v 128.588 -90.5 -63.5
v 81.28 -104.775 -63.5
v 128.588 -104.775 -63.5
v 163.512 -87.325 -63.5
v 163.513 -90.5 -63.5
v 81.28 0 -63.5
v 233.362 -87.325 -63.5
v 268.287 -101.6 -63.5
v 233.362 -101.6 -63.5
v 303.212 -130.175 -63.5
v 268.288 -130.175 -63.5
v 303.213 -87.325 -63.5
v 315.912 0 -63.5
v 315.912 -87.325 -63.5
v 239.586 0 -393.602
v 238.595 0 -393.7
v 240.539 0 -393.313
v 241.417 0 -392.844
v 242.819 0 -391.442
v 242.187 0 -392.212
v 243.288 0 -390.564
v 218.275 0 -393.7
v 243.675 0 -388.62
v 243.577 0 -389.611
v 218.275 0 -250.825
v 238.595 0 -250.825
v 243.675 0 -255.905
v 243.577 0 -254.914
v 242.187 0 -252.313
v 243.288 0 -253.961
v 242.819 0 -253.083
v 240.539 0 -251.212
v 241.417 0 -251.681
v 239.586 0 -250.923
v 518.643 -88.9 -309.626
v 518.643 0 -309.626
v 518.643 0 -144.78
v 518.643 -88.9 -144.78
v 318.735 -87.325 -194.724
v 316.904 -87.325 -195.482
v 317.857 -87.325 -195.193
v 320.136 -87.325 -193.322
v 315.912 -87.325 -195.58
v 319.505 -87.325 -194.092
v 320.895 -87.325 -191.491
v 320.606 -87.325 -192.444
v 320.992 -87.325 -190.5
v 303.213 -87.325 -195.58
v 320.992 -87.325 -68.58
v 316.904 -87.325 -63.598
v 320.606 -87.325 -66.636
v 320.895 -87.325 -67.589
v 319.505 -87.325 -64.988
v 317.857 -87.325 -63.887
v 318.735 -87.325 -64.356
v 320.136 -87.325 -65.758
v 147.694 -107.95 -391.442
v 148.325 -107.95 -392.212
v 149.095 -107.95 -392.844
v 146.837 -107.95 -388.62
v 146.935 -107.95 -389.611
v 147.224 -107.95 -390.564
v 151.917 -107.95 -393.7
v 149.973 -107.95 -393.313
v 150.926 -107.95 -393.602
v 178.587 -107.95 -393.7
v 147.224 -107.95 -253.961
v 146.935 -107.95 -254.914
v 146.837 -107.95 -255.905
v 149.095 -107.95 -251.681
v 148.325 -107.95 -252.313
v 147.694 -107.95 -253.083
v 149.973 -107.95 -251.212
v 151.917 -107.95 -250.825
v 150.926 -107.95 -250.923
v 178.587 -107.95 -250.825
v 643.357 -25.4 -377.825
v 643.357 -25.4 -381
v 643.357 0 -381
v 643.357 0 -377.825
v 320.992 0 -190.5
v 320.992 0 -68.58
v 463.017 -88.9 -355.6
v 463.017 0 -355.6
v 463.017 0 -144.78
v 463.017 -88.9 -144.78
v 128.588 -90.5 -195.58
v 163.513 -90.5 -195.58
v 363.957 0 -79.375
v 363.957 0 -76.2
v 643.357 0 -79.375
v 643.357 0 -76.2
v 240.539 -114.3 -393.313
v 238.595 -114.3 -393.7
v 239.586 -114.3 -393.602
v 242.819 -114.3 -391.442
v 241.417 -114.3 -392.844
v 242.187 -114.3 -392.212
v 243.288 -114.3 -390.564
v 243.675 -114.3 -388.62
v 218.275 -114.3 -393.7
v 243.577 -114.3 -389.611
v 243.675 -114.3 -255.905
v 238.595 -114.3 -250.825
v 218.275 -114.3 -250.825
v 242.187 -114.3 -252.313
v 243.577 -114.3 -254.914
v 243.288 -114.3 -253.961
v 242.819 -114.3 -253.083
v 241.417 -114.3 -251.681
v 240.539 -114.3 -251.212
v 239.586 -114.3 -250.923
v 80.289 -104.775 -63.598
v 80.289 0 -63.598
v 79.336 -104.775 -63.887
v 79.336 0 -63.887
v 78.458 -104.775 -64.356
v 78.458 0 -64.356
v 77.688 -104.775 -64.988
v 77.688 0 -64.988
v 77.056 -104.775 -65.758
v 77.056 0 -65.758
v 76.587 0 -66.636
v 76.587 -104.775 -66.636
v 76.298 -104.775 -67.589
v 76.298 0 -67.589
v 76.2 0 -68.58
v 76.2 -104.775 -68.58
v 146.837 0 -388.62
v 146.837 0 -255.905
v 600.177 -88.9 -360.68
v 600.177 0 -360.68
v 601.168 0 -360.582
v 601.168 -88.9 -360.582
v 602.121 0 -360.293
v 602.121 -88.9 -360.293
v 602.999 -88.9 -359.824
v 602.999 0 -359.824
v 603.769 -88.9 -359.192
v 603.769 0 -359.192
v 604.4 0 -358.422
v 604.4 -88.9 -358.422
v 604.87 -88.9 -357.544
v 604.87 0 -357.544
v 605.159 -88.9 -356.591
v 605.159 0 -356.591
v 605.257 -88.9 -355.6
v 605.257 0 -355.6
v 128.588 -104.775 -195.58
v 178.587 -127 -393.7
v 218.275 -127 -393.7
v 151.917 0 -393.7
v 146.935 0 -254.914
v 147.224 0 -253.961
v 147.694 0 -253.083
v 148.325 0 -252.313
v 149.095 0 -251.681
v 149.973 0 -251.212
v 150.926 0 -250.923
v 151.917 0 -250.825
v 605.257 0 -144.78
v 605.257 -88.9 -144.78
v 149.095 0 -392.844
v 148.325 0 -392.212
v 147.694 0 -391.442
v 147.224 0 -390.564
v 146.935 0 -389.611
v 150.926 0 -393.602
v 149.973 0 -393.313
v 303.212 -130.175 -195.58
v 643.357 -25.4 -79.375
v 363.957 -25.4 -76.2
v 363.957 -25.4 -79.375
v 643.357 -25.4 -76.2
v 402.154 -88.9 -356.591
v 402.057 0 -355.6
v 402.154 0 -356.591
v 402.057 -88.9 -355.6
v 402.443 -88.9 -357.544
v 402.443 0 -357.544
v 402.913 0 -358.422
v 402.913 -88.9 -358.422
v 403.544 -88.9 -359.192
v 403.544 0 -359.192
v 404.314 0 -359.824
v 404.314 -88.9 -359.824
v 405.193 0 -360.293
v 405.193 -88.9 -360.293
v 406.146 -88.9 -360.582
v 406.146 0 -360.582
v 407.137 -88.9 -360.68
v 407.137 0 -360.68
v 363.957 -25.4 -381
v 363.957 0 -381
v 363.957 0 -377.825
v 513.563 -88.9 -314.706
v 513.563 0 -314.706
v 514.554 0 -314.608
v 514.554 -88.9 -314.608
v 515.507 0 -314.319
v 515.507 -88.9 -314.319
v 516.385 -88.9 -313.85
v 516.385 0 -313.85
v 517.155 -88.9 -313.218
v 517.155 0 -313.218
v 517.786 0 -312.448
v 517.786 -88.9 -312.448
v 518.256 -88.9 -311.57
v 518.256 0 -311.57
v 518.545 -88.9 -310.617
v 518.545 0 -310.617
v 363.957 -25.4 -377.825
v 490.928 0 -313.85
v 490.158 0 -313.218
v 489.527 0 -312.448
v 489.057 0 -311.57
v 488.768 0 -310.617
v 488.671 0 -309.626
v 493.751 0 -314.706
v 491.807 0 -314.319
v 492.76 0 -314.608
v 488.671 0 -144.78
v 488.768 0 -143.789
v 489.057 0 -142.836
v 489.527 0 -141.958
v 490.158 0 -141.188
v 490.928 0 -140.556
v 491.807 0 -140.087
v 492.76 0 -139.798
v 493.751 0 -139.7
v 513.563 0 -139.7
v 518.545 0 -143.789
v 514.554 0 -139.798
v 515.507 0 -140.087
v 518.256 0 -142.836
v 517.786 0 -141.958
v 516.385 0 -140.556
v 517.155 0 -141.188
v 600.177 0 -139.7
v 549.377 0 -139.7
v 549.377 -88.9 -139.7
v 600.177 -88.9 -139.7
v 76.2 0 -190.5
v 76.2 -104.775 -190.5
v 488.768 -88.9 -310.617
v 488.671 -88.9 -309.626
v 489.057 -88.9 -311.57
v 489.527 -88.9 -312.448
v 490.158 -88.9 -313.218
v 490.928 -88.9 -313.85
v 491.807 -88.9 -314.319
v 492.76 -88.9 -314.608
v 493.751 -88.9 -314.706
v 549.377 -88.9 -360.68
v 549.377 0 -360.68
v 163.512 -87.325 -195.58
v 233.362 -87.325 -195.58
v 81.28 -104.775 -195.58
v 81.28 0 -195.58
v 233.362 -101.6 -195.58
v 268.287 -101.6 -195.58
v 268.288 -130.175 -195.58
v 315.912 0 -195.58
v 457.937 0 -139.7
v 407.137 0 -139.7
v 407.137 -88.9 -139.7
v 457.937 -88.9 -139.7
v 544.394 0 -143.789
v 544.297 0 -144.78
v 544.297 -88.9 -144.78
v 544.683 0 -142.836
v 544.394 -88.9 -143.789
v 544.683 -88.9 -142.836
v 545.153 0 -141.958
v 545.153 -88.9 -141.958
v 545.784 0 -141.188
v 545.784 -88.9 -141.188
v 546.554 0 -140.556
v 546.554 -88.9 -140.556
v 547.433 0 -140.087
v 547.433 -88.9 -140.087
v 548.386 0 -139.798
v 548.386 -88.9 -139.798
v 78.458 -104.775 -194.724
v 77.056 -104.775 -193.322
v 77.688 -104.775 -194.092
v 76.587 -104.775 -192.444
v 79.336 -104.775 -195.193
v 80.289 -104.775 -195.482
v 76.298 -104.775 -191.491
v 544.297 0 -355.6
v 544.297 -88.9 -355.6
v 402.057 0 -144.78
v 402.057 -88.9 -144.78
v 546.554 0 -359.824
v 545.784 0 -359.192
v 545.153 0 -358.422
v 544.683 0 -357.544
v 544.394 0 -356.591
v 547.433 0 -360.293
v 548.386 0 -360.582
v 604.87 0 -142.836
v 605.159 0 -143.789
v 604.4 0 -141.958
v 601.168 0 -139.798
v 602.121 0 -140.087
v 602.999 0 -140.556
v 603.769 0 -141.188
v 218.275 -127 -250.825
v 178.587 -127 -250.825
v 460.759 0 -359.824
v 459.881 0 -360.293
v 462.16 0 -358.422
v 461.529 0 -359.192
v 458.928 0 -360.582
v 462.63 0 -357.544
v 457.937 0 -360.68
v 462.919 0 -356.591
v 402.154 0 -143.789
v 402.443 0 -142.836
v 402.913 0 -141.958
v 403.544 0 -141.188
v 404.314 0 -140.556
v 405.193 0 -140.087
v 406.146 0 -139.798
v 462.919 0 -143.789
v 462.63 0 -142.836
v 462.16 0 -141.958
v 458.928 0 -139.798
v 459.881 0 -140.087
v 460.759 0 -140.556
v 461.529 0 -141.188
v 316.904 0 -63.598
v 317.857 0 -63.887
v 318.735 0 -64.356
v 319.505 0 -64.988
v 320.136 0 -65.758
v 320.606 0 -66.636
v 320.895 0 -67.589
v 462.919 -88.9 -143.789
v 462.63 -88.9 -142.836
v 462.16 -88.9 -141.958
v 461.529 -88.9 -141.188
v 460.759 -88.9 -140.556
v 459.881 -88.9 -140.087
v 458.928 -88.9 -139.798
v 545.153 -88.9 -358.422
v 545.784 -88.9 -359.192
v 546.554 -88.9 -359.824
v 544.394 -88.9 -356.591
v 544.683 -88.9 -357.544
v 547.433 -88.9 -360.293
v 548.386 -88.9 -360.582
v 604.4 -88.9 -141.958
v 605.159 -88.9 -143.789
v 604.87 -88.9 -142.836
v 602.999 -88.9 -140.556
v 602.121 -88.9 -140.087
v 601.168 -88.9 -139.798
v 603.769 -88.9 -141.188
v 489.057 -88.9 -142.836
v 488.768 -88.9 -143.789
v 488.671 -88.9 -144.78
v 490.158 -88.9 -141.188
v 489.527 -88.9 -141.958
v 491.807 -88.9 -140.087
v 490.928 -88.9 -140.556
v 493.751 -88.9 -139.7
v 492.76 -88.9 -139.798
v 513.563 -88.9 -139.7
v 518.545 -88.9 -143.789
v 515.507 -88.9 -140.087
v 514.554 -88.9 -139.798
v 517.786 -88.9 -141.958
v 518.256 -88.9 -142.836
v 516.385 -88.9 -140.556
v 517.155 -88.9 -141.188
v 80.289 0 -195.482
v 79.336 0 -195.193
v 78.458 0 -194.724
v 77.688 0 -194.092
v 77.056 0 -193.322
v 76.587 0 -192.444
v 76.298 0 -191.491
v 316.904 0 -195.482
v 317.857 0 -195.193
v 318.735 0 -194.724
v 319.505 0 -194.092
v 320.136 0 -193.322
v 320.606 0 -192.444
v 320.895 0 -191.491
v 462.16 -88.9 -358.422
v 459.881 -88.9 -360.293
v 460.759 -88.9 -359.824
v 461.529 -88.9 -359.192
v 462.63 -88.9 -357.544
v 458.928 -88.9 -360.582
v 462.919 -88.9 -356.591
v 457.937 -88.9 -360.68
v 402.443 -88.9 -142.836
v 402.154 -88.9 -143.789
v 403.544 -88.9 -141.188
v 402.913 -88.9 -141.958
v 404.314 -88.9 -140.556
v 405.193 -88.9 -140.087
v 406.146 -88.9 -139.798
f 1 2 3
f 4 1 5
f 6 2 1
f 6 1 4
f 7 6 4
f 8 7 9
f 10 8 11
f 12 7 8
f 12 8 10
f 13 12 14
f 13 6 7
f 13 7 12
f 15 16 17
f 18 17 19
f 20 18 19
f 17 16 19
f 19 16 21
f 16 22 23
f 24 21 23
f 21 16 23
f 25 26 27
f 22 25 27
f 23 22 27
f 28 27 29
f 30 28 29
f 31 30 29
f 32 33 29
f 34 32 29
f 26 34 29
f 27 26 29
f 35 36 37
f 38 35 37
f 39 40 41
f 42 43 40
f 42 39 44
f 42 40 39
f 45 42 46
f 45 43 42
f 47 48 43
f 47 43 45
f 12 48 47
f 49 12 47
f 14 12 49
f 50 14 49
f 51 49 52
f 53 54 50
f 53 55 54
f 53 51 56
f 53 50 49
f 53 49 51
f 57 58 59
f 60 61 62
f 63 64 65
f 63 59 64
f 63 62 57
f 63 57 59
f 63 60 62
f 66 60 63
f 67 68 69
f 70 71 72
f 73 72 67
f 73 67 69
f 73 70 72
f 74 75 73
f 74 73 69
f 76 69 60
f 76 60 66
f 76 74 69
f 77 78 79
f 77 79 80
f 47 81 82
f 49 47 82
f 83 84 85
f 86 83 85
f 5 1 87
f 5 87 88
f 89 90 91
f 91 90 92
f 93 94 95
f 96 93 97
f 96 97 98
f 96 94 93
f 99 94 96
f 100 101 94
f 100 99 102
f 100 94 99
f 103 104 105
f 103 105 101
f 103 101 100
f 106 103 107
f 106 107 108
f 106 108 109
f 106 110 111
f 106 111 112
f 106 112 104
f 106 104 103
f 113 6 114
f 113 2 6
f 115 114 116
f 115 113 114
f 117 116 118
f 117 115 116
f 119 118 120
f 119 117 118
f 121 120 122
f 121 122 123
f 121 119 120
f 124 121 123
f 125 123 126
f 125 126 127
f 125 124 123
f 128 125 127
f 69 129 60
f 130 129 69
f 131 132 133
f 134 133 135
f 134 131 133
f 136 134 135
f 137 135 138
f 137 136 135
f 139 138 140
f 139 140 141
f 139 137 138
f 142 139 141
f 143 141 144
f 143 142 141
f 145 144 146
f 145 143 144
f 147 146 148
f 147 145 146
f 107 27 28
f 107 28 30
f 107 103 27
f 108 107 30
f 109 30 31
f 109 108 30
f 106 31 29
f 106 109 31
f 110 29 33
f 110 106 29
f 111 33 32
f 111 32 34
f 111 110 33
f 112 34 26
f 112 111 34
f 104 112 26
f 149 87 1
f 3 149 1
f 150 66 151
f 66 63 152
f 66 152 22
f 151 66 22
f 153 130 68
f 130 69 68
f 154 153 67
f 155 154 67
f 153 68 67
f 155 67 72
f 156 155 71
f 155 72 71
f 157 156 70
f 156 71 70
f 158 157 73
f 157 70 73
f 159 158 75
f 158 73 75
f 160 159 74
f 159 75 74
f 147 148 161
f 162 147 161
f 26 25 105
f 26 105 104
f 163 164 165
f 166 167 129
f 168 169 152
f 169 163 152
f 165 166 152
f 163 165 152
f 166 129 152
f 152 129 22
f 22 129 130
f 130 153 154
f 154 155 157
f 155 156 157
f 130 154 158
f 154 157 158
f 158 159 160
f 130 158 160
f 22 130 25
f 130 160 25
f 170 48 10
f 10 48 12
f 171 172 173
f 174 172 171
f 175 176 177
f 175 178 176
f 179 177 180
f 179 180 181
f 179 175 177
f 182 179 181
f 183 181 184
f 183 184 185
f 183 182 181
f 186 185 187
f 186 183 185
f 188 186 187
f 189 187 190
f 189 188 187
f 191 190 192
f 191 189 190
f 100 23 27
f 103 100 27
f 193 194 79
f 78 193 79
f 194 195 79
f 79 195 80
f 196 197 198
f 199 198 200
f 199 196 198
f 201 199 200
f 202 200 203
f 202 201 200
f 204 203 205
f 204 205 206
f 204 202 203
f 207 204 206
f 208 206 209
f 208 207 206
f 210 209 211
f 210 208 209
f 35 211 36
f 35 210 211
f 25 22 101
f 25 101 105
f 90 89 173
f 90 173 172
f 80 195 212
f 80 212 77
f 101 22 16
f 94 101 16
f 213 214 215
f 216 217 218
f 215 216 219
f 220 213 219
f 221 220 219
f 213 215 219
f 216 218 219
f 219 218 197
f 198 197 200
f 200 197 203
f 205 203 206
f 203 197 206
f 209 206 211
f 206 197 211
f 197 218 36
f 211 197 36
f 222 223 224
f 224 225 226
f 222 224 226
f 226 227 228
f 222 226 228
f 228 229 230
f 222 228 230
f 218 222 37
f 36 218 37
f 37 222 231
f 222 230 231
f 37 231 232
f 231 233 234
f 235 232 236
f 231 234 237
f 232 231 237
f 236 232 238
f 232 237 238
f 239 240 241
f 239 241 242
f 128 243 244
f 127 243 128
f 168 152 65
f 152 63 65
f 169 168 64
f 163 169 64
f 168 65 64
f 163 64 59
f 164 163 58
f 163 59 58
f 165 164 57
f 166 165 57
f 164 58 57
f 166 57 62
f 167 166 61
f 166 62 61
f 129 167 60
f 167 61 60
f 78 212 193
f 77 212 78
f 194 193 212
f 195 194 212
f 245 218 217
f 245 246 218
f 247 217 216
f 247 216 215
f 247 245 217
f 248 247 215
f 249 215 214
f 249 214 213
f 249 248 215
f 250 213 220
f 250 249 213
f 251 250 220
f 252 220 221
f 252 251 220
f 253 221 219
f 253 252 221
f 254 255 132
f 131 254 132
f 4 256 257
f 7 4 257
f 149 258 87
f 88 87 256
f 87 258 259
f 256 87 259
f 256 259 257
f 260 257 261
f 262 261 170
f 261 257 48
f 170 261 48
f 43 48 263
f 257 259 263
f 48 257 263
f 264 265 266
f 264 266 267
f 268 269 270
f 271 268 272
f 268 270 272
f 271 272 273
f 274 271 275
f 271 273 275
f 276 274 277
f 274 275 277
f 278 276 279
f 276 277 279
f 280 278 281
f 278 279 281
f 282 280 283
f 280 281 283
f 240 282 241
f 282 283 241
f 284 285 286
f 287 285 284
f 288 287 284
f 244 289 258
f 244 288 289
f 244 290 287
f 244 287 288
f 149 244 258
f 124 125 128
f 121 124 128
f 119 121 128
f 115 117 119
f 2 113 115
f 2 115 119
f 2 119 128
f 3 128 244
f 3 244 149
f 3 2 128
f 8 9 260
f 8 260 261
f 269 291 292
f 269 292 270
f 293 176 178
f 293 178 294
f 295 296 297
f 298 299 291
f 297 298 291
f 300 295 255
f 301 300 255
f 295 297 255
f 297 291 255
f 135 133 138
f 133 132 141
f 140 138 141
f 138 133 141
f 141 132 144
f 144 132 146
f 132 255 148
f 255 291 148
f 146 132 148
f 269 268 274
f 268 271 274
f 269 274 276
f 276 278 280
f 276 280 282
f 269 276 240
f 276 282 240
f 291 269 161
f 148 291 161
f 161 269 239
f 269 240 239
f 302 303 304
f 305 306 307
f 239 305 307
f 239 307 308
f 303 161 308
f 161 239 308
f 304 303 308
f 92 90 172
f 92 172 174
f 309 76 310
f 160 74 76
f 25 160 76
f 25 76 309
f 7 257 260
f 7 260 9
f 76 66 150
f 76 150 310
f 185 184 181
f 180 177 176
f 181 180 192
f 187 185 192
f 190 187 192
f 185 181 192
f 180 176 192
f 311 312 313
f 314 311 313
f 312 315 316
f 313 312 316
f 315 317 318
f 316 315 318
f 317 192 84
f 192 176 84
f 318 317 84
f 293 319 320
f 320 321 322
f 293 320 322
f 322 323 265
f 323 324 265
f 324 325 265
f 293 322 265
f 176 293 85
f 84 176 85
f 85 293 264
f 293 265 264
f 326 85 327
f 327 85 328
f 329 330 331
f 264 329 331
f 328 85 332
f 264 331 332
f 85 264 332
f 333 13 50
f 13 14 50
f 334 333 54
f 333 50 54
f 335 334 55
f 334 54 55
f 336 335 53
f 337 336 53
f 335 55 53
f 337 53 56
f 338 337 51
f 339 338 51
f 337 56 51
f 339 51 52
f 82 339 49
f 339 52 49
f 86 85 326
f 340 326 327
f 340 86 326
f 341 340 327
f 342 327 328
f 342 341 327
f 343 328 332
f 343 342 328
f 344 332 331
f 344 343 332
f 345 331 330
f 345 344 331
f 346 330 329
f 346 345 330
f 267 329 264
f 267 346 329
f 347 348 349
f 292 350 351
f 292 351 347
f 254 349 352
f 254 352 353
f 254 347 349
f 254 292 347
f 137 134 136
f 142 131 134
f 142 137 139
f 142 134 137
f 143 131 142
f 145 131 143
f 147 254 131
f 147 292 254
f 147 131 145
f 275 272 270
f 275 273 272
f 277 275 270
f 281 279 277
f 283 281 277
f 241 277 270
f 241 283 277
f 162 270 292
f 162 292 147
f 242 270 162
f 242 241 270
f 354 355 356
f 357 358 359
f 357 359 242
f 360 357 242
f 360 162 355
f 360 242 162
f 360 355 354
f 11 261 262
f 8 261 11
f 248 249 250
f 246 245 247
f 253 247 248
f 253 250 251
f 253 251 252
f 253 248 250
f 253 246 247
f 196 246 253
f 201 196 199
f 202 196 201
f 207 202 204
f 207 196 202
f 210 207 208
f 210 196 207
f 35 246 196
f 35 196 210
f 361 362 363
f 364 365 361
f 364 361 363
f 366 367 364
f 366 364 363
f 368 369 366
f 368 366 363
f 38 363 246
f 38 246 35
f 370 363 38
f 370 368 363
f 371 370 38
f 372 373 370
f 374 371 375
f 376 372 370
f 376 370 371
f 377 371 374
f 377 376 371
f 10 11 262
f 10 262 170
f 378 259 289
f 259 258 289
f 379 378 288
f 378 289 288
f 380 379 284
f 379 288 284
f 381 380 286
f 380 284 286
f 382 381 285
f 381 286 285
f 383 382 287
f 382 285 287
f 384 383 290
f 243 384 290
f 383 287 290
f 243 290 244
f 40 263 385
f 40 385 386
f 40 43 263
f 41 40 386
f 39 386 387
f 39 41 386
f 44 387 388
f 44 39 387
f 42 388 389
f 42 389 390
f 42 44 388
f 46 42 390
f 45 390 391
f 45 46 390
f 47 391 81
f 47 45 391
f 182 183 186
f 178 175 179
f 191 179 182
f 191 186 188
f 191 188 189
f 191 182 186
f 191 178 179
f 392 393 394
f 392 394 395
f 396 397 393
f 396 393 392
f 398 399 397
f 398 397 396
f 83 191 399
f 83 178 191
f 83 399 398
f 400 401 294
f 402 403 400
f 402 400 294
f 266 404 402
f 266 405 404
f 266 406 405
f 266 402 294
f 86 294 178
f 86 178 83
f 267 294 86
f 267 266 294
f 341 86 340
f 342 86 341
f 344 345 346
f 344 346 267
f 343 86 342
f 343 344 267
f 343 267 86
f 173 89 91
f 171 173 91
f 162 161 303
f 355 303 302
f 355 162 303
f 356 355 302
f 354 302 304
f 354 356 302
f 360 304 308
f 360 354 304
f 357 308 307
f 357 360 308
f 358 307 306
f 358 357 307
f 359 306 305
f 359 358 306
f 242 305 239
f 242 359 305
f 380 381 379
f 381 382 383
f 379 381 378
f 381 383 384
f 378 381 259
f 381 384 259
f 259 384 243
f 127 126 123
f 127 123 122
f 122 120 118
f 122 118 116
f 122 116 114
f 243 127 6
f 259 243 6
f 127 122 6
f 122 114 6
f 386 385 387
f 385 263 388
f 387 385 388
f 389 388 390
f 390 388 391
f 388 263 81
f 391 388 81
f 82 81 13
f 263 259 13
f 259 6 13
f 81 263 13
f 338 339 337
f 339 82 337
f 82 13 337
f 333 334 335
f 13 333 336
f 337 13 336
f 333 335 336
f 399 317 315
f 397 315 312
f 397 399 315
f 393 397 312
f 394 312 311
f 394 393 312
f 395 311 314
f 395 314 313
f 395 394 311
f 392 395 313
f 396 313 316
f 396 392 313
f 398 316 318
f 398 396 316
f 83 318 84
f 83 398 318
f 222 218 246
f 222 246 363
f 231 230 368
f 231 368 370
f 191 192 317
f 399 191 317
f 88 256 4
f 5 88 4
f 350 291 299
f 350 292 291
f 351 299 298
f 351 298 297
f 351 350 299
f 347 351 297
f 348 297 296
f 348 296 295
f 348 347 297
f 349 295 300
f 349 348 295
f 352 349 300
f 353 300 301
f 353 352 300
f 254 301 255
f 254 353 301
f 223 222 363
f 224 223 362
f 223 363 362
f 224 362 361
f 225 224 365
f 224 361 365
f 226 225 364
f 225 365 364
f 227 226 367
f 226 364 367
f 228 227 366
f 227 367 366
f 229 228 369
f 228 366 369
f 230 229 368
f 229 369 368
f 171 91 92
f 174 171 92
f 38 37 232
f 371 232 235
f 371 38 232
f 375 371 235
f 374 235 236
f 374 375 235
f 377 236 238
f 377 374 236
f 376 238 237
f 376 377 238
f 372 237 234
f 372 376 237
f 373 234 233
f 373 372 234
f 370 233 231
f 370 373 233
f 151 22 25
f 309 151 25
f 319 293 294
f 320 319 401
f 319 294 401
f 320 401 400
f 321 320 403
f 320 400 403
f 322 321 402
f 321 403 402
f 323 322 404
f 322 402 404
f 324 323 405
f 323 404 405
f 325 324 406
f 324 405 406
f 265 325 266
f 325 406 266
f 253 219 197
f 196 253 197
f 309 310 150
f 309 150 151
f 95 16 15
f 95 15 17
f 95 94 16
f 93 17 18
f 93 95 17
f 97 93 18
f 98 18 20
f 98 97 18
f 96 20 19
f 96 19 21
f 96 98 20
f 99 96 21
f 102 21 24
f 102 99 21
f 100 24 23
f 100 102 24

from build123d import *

# Parameters (mm, degrees)
F0_W      = 60.96
F0_H      = 220.98
F1_DEPTH  = 88.9
F0_W_2    = 29.972
F0_H_2    = 175.006
F2_R      = 5.08
F2_2_R    = 5.08
F2_3_R    = 5.08
F3_R      = 5.08
F0_W_3    = 52.3875
F0_H_3    = 132.08
F4_DEPTH  = 104.775
F0_W_4    = 34.925
F5_DEPTH  = 90.5002
F0_W_5    = 69.85
F6_DEPTH  = 87.3252
F7_DEPTH  = 101.6
F8_DEPTH  = 130.175
F0_W_6    = 17.78
F9_DEPTH  = 87.3252
F0_W_7    = 31.75
F0_H_4    = 142.875
F10_DEPTH = 107.95
F0_W_8    = 39.6875
F11_DEPTH = 127
F0_W_9    = 25.4
F12_DEPTH = 114.3
F13_W     = 279.4
F13_H     = 3.175
F14_DEPTH = 25.4
F15_R     = 5.08
F15_2_R   = 5.08
F15_3_R   = 5.08


with BuildPart() as f1:
    # F0 (on Front) → F1 (new body)
    with BuildSketch(Plane.XZ):
        with Locations((432.5366, -250.19)):
            Rectangle(F0_W, F0_H)
    extrude(amount=F1_DEPTH)

    # F2
    f2_edges = [f1.edges().sort_by_distance(p)[0] for p in [
        (463.0166, -44.45, -139.7),
        (402.0566, -44.45, -139.7),
        (402.0566, -44.45, -360.68),
        (463.0166, -44.45, -360.68),
    ]]
    fillet(f2_edges, radius=F2_R)


with BuildPart() as f1b:
    # F0 (on Front) → F1, piece 2 (new body)
    with BuildSketch(Plane.XZ):
        with Locations((574.7766, -250.19)):
            Rectangle(F0_W, F0_H)
    extrude(amount=F1_DEPTH)

    # F2#2
    f2_2_edges = [f1b.edges().sort_by_distance(p)[0] for p in [
        (605.2566, -44.45, -139.7),
        (544.2966, -44.45, -139.7),
        (544.2966, -44.45, -360.68),
        (605.2566, -44.45, -360.68),
    ]]
    fillet(f2_2_edges, radius=F2_2_R)


with BuildPart() as f1c:
    # F0 (on Front) → F1, piece 3 (new body)
    with BuildSketch(Plane.XZ):
        with Locations((503.6566, -227.203)):
            Rectangle(F0_W_2, F0_H_2)
    extrude(amount=F1_DEPTH)

    # F2#3
    f2_3_edges = [f1c.edges().sort_by_distance(p)[0] for p in [
        (518.6426, -44.45, -139.7),
        (488.6706, -44.45, -314.706),
        (518.6426, -44.45, -314.706),
    ]]
    fillet(f2_3_edges, radius=F2_3_R)

    # F3
    f3_edges = [f1c.edges().sort_by_distance(p)[0] for p in [
        (488.6706, -44.45, -139.7),
    ]]
    fillet(f3_edges, radius=F3_R)


with BuildPart() as f4:
    # F0 (on Front) → F4 (new body)
    with BuildSketch(Plane.XZ):
        with Locations((102.39375, -129.54)):
            Rectangle(F0_W_3, F0_H_3)
    extrude(amount=F4_DEPTH)

    # F0 (on Front) → F5 (join)
    with BuildSketch(Plane.XZ):
        with Locations((146.05, -129.54)):
            Rectangle(F0_W_4, F0_H_3)
    extrude(amount=F5_DEPTH)

    # F0 (on Front) → F6 (join)
    with BuildSketch(Plane.XZ):
        with Locations((198.4375, -129.54)):
            Rectangle(F0_W_5, F0_H_3)
    extrude(amount=F6_DEPTH)

    # F0 (on Front) → F7 (join)
    with BuildSketch(Plane.XZ):
        with Locations((250.825, -129.54)):
            Rectangle(F0_W_4, F0_H_3)
    extrude(amount=F7_DEPTH)

    # F0 (on Front) → F8 (join)
    with BuildSketch(Plane.XZ):
        with Locations((285.75, -129.54)):
            Rectangle(F0_W_4, F0_H_3)
    extrude(amount=F8_DEPTH)

    # F0 (on Front) → F9 (join)
    with BuildSketch(Plane.XZ):
        with Locations((312.1025, -129.54)):
            Rectangle(F0_W_6, F0_H_3)
    extrude(amount=F9_DEPTH)

    # F15
    f15_edges = [f4.edges().sort_by_distance(p)[0] for p in [
        (320.9925, -43.6626, -63.5),
        (76.2, -52.3875, -63.5),
        (320.9925, -43.6626, -195.58),
        (76.2, -52.3875, -195.58),
    ]]
    fillet(f15_edges, radius=F15_R)


with BuildPart() as f10:
    # F0 (on Front) → F10 (new body)
    with BuildSketch(Plane.XZ):
        with Locations((162.7124, -322.2625)):
            Rectangle(F0_W_7, F0_H_4)
    extrude(amount=F10_DEPTH)

    # F0 (on Front) → F11 (join)
    with BuildSketch(Plane.XZ):
        with Locations((198.43115, -322.2625)):
            Rectangle(F0_W_8, F0_H_4)
    extrude(amount=F11_DEPTH)

    # F15#2
    f15_2_edges = [f10.edges().sort_by_distance(p)[0] for p in [
        (146.8374, -53.975, -250.825),
        (146.8374, -53.975, -393.7),
    ]]
    fillet(f15_2_edges, radius=F15_2_R)


with BuildPart() as f12:
    # F0 (on Front) → F12 (new body)
    with BuildSketch(Plane.XZ):
        with Locations((230.9749, -322.2625)):
            Rectangle(F0_W_9, F0_H_4)
    extrude(amount=F12_DEPTH)

    # F15#3
    f15_3_edges = [f12.edges().sort_by_distance(p)[0] for p in [
        (243.6749, -57.15, -250.825),
        (243.6749, -57.15, -393.7),
    ]]
    fillet(f15_3_edges, radius=F15_3_R)


with BuildPart() as f14:
    # F13 (on Front) → F14 (new body)
    with BuildSketch(Plane.XZ):
        with Locations((503.6566, -77.7875)):
            Rectangle(F13_W, F13_H)
    extrude(amount=F14_DEPTH)


with BuildPart() as f14b:
    # F13 (on Front) → F14, piece 2 (new body)
    with BuildSketch(Plane.XZ):
        with Locations((503.6566, -379.4125)):
            Rectangle(F13_W, F13_H)
    extrude(amount=F14_DEPTH)


solid = Compound([f1.part, f1b.part, f1c.part, f4.part, f10.part, f12.part, f14.part, f14b.part])
